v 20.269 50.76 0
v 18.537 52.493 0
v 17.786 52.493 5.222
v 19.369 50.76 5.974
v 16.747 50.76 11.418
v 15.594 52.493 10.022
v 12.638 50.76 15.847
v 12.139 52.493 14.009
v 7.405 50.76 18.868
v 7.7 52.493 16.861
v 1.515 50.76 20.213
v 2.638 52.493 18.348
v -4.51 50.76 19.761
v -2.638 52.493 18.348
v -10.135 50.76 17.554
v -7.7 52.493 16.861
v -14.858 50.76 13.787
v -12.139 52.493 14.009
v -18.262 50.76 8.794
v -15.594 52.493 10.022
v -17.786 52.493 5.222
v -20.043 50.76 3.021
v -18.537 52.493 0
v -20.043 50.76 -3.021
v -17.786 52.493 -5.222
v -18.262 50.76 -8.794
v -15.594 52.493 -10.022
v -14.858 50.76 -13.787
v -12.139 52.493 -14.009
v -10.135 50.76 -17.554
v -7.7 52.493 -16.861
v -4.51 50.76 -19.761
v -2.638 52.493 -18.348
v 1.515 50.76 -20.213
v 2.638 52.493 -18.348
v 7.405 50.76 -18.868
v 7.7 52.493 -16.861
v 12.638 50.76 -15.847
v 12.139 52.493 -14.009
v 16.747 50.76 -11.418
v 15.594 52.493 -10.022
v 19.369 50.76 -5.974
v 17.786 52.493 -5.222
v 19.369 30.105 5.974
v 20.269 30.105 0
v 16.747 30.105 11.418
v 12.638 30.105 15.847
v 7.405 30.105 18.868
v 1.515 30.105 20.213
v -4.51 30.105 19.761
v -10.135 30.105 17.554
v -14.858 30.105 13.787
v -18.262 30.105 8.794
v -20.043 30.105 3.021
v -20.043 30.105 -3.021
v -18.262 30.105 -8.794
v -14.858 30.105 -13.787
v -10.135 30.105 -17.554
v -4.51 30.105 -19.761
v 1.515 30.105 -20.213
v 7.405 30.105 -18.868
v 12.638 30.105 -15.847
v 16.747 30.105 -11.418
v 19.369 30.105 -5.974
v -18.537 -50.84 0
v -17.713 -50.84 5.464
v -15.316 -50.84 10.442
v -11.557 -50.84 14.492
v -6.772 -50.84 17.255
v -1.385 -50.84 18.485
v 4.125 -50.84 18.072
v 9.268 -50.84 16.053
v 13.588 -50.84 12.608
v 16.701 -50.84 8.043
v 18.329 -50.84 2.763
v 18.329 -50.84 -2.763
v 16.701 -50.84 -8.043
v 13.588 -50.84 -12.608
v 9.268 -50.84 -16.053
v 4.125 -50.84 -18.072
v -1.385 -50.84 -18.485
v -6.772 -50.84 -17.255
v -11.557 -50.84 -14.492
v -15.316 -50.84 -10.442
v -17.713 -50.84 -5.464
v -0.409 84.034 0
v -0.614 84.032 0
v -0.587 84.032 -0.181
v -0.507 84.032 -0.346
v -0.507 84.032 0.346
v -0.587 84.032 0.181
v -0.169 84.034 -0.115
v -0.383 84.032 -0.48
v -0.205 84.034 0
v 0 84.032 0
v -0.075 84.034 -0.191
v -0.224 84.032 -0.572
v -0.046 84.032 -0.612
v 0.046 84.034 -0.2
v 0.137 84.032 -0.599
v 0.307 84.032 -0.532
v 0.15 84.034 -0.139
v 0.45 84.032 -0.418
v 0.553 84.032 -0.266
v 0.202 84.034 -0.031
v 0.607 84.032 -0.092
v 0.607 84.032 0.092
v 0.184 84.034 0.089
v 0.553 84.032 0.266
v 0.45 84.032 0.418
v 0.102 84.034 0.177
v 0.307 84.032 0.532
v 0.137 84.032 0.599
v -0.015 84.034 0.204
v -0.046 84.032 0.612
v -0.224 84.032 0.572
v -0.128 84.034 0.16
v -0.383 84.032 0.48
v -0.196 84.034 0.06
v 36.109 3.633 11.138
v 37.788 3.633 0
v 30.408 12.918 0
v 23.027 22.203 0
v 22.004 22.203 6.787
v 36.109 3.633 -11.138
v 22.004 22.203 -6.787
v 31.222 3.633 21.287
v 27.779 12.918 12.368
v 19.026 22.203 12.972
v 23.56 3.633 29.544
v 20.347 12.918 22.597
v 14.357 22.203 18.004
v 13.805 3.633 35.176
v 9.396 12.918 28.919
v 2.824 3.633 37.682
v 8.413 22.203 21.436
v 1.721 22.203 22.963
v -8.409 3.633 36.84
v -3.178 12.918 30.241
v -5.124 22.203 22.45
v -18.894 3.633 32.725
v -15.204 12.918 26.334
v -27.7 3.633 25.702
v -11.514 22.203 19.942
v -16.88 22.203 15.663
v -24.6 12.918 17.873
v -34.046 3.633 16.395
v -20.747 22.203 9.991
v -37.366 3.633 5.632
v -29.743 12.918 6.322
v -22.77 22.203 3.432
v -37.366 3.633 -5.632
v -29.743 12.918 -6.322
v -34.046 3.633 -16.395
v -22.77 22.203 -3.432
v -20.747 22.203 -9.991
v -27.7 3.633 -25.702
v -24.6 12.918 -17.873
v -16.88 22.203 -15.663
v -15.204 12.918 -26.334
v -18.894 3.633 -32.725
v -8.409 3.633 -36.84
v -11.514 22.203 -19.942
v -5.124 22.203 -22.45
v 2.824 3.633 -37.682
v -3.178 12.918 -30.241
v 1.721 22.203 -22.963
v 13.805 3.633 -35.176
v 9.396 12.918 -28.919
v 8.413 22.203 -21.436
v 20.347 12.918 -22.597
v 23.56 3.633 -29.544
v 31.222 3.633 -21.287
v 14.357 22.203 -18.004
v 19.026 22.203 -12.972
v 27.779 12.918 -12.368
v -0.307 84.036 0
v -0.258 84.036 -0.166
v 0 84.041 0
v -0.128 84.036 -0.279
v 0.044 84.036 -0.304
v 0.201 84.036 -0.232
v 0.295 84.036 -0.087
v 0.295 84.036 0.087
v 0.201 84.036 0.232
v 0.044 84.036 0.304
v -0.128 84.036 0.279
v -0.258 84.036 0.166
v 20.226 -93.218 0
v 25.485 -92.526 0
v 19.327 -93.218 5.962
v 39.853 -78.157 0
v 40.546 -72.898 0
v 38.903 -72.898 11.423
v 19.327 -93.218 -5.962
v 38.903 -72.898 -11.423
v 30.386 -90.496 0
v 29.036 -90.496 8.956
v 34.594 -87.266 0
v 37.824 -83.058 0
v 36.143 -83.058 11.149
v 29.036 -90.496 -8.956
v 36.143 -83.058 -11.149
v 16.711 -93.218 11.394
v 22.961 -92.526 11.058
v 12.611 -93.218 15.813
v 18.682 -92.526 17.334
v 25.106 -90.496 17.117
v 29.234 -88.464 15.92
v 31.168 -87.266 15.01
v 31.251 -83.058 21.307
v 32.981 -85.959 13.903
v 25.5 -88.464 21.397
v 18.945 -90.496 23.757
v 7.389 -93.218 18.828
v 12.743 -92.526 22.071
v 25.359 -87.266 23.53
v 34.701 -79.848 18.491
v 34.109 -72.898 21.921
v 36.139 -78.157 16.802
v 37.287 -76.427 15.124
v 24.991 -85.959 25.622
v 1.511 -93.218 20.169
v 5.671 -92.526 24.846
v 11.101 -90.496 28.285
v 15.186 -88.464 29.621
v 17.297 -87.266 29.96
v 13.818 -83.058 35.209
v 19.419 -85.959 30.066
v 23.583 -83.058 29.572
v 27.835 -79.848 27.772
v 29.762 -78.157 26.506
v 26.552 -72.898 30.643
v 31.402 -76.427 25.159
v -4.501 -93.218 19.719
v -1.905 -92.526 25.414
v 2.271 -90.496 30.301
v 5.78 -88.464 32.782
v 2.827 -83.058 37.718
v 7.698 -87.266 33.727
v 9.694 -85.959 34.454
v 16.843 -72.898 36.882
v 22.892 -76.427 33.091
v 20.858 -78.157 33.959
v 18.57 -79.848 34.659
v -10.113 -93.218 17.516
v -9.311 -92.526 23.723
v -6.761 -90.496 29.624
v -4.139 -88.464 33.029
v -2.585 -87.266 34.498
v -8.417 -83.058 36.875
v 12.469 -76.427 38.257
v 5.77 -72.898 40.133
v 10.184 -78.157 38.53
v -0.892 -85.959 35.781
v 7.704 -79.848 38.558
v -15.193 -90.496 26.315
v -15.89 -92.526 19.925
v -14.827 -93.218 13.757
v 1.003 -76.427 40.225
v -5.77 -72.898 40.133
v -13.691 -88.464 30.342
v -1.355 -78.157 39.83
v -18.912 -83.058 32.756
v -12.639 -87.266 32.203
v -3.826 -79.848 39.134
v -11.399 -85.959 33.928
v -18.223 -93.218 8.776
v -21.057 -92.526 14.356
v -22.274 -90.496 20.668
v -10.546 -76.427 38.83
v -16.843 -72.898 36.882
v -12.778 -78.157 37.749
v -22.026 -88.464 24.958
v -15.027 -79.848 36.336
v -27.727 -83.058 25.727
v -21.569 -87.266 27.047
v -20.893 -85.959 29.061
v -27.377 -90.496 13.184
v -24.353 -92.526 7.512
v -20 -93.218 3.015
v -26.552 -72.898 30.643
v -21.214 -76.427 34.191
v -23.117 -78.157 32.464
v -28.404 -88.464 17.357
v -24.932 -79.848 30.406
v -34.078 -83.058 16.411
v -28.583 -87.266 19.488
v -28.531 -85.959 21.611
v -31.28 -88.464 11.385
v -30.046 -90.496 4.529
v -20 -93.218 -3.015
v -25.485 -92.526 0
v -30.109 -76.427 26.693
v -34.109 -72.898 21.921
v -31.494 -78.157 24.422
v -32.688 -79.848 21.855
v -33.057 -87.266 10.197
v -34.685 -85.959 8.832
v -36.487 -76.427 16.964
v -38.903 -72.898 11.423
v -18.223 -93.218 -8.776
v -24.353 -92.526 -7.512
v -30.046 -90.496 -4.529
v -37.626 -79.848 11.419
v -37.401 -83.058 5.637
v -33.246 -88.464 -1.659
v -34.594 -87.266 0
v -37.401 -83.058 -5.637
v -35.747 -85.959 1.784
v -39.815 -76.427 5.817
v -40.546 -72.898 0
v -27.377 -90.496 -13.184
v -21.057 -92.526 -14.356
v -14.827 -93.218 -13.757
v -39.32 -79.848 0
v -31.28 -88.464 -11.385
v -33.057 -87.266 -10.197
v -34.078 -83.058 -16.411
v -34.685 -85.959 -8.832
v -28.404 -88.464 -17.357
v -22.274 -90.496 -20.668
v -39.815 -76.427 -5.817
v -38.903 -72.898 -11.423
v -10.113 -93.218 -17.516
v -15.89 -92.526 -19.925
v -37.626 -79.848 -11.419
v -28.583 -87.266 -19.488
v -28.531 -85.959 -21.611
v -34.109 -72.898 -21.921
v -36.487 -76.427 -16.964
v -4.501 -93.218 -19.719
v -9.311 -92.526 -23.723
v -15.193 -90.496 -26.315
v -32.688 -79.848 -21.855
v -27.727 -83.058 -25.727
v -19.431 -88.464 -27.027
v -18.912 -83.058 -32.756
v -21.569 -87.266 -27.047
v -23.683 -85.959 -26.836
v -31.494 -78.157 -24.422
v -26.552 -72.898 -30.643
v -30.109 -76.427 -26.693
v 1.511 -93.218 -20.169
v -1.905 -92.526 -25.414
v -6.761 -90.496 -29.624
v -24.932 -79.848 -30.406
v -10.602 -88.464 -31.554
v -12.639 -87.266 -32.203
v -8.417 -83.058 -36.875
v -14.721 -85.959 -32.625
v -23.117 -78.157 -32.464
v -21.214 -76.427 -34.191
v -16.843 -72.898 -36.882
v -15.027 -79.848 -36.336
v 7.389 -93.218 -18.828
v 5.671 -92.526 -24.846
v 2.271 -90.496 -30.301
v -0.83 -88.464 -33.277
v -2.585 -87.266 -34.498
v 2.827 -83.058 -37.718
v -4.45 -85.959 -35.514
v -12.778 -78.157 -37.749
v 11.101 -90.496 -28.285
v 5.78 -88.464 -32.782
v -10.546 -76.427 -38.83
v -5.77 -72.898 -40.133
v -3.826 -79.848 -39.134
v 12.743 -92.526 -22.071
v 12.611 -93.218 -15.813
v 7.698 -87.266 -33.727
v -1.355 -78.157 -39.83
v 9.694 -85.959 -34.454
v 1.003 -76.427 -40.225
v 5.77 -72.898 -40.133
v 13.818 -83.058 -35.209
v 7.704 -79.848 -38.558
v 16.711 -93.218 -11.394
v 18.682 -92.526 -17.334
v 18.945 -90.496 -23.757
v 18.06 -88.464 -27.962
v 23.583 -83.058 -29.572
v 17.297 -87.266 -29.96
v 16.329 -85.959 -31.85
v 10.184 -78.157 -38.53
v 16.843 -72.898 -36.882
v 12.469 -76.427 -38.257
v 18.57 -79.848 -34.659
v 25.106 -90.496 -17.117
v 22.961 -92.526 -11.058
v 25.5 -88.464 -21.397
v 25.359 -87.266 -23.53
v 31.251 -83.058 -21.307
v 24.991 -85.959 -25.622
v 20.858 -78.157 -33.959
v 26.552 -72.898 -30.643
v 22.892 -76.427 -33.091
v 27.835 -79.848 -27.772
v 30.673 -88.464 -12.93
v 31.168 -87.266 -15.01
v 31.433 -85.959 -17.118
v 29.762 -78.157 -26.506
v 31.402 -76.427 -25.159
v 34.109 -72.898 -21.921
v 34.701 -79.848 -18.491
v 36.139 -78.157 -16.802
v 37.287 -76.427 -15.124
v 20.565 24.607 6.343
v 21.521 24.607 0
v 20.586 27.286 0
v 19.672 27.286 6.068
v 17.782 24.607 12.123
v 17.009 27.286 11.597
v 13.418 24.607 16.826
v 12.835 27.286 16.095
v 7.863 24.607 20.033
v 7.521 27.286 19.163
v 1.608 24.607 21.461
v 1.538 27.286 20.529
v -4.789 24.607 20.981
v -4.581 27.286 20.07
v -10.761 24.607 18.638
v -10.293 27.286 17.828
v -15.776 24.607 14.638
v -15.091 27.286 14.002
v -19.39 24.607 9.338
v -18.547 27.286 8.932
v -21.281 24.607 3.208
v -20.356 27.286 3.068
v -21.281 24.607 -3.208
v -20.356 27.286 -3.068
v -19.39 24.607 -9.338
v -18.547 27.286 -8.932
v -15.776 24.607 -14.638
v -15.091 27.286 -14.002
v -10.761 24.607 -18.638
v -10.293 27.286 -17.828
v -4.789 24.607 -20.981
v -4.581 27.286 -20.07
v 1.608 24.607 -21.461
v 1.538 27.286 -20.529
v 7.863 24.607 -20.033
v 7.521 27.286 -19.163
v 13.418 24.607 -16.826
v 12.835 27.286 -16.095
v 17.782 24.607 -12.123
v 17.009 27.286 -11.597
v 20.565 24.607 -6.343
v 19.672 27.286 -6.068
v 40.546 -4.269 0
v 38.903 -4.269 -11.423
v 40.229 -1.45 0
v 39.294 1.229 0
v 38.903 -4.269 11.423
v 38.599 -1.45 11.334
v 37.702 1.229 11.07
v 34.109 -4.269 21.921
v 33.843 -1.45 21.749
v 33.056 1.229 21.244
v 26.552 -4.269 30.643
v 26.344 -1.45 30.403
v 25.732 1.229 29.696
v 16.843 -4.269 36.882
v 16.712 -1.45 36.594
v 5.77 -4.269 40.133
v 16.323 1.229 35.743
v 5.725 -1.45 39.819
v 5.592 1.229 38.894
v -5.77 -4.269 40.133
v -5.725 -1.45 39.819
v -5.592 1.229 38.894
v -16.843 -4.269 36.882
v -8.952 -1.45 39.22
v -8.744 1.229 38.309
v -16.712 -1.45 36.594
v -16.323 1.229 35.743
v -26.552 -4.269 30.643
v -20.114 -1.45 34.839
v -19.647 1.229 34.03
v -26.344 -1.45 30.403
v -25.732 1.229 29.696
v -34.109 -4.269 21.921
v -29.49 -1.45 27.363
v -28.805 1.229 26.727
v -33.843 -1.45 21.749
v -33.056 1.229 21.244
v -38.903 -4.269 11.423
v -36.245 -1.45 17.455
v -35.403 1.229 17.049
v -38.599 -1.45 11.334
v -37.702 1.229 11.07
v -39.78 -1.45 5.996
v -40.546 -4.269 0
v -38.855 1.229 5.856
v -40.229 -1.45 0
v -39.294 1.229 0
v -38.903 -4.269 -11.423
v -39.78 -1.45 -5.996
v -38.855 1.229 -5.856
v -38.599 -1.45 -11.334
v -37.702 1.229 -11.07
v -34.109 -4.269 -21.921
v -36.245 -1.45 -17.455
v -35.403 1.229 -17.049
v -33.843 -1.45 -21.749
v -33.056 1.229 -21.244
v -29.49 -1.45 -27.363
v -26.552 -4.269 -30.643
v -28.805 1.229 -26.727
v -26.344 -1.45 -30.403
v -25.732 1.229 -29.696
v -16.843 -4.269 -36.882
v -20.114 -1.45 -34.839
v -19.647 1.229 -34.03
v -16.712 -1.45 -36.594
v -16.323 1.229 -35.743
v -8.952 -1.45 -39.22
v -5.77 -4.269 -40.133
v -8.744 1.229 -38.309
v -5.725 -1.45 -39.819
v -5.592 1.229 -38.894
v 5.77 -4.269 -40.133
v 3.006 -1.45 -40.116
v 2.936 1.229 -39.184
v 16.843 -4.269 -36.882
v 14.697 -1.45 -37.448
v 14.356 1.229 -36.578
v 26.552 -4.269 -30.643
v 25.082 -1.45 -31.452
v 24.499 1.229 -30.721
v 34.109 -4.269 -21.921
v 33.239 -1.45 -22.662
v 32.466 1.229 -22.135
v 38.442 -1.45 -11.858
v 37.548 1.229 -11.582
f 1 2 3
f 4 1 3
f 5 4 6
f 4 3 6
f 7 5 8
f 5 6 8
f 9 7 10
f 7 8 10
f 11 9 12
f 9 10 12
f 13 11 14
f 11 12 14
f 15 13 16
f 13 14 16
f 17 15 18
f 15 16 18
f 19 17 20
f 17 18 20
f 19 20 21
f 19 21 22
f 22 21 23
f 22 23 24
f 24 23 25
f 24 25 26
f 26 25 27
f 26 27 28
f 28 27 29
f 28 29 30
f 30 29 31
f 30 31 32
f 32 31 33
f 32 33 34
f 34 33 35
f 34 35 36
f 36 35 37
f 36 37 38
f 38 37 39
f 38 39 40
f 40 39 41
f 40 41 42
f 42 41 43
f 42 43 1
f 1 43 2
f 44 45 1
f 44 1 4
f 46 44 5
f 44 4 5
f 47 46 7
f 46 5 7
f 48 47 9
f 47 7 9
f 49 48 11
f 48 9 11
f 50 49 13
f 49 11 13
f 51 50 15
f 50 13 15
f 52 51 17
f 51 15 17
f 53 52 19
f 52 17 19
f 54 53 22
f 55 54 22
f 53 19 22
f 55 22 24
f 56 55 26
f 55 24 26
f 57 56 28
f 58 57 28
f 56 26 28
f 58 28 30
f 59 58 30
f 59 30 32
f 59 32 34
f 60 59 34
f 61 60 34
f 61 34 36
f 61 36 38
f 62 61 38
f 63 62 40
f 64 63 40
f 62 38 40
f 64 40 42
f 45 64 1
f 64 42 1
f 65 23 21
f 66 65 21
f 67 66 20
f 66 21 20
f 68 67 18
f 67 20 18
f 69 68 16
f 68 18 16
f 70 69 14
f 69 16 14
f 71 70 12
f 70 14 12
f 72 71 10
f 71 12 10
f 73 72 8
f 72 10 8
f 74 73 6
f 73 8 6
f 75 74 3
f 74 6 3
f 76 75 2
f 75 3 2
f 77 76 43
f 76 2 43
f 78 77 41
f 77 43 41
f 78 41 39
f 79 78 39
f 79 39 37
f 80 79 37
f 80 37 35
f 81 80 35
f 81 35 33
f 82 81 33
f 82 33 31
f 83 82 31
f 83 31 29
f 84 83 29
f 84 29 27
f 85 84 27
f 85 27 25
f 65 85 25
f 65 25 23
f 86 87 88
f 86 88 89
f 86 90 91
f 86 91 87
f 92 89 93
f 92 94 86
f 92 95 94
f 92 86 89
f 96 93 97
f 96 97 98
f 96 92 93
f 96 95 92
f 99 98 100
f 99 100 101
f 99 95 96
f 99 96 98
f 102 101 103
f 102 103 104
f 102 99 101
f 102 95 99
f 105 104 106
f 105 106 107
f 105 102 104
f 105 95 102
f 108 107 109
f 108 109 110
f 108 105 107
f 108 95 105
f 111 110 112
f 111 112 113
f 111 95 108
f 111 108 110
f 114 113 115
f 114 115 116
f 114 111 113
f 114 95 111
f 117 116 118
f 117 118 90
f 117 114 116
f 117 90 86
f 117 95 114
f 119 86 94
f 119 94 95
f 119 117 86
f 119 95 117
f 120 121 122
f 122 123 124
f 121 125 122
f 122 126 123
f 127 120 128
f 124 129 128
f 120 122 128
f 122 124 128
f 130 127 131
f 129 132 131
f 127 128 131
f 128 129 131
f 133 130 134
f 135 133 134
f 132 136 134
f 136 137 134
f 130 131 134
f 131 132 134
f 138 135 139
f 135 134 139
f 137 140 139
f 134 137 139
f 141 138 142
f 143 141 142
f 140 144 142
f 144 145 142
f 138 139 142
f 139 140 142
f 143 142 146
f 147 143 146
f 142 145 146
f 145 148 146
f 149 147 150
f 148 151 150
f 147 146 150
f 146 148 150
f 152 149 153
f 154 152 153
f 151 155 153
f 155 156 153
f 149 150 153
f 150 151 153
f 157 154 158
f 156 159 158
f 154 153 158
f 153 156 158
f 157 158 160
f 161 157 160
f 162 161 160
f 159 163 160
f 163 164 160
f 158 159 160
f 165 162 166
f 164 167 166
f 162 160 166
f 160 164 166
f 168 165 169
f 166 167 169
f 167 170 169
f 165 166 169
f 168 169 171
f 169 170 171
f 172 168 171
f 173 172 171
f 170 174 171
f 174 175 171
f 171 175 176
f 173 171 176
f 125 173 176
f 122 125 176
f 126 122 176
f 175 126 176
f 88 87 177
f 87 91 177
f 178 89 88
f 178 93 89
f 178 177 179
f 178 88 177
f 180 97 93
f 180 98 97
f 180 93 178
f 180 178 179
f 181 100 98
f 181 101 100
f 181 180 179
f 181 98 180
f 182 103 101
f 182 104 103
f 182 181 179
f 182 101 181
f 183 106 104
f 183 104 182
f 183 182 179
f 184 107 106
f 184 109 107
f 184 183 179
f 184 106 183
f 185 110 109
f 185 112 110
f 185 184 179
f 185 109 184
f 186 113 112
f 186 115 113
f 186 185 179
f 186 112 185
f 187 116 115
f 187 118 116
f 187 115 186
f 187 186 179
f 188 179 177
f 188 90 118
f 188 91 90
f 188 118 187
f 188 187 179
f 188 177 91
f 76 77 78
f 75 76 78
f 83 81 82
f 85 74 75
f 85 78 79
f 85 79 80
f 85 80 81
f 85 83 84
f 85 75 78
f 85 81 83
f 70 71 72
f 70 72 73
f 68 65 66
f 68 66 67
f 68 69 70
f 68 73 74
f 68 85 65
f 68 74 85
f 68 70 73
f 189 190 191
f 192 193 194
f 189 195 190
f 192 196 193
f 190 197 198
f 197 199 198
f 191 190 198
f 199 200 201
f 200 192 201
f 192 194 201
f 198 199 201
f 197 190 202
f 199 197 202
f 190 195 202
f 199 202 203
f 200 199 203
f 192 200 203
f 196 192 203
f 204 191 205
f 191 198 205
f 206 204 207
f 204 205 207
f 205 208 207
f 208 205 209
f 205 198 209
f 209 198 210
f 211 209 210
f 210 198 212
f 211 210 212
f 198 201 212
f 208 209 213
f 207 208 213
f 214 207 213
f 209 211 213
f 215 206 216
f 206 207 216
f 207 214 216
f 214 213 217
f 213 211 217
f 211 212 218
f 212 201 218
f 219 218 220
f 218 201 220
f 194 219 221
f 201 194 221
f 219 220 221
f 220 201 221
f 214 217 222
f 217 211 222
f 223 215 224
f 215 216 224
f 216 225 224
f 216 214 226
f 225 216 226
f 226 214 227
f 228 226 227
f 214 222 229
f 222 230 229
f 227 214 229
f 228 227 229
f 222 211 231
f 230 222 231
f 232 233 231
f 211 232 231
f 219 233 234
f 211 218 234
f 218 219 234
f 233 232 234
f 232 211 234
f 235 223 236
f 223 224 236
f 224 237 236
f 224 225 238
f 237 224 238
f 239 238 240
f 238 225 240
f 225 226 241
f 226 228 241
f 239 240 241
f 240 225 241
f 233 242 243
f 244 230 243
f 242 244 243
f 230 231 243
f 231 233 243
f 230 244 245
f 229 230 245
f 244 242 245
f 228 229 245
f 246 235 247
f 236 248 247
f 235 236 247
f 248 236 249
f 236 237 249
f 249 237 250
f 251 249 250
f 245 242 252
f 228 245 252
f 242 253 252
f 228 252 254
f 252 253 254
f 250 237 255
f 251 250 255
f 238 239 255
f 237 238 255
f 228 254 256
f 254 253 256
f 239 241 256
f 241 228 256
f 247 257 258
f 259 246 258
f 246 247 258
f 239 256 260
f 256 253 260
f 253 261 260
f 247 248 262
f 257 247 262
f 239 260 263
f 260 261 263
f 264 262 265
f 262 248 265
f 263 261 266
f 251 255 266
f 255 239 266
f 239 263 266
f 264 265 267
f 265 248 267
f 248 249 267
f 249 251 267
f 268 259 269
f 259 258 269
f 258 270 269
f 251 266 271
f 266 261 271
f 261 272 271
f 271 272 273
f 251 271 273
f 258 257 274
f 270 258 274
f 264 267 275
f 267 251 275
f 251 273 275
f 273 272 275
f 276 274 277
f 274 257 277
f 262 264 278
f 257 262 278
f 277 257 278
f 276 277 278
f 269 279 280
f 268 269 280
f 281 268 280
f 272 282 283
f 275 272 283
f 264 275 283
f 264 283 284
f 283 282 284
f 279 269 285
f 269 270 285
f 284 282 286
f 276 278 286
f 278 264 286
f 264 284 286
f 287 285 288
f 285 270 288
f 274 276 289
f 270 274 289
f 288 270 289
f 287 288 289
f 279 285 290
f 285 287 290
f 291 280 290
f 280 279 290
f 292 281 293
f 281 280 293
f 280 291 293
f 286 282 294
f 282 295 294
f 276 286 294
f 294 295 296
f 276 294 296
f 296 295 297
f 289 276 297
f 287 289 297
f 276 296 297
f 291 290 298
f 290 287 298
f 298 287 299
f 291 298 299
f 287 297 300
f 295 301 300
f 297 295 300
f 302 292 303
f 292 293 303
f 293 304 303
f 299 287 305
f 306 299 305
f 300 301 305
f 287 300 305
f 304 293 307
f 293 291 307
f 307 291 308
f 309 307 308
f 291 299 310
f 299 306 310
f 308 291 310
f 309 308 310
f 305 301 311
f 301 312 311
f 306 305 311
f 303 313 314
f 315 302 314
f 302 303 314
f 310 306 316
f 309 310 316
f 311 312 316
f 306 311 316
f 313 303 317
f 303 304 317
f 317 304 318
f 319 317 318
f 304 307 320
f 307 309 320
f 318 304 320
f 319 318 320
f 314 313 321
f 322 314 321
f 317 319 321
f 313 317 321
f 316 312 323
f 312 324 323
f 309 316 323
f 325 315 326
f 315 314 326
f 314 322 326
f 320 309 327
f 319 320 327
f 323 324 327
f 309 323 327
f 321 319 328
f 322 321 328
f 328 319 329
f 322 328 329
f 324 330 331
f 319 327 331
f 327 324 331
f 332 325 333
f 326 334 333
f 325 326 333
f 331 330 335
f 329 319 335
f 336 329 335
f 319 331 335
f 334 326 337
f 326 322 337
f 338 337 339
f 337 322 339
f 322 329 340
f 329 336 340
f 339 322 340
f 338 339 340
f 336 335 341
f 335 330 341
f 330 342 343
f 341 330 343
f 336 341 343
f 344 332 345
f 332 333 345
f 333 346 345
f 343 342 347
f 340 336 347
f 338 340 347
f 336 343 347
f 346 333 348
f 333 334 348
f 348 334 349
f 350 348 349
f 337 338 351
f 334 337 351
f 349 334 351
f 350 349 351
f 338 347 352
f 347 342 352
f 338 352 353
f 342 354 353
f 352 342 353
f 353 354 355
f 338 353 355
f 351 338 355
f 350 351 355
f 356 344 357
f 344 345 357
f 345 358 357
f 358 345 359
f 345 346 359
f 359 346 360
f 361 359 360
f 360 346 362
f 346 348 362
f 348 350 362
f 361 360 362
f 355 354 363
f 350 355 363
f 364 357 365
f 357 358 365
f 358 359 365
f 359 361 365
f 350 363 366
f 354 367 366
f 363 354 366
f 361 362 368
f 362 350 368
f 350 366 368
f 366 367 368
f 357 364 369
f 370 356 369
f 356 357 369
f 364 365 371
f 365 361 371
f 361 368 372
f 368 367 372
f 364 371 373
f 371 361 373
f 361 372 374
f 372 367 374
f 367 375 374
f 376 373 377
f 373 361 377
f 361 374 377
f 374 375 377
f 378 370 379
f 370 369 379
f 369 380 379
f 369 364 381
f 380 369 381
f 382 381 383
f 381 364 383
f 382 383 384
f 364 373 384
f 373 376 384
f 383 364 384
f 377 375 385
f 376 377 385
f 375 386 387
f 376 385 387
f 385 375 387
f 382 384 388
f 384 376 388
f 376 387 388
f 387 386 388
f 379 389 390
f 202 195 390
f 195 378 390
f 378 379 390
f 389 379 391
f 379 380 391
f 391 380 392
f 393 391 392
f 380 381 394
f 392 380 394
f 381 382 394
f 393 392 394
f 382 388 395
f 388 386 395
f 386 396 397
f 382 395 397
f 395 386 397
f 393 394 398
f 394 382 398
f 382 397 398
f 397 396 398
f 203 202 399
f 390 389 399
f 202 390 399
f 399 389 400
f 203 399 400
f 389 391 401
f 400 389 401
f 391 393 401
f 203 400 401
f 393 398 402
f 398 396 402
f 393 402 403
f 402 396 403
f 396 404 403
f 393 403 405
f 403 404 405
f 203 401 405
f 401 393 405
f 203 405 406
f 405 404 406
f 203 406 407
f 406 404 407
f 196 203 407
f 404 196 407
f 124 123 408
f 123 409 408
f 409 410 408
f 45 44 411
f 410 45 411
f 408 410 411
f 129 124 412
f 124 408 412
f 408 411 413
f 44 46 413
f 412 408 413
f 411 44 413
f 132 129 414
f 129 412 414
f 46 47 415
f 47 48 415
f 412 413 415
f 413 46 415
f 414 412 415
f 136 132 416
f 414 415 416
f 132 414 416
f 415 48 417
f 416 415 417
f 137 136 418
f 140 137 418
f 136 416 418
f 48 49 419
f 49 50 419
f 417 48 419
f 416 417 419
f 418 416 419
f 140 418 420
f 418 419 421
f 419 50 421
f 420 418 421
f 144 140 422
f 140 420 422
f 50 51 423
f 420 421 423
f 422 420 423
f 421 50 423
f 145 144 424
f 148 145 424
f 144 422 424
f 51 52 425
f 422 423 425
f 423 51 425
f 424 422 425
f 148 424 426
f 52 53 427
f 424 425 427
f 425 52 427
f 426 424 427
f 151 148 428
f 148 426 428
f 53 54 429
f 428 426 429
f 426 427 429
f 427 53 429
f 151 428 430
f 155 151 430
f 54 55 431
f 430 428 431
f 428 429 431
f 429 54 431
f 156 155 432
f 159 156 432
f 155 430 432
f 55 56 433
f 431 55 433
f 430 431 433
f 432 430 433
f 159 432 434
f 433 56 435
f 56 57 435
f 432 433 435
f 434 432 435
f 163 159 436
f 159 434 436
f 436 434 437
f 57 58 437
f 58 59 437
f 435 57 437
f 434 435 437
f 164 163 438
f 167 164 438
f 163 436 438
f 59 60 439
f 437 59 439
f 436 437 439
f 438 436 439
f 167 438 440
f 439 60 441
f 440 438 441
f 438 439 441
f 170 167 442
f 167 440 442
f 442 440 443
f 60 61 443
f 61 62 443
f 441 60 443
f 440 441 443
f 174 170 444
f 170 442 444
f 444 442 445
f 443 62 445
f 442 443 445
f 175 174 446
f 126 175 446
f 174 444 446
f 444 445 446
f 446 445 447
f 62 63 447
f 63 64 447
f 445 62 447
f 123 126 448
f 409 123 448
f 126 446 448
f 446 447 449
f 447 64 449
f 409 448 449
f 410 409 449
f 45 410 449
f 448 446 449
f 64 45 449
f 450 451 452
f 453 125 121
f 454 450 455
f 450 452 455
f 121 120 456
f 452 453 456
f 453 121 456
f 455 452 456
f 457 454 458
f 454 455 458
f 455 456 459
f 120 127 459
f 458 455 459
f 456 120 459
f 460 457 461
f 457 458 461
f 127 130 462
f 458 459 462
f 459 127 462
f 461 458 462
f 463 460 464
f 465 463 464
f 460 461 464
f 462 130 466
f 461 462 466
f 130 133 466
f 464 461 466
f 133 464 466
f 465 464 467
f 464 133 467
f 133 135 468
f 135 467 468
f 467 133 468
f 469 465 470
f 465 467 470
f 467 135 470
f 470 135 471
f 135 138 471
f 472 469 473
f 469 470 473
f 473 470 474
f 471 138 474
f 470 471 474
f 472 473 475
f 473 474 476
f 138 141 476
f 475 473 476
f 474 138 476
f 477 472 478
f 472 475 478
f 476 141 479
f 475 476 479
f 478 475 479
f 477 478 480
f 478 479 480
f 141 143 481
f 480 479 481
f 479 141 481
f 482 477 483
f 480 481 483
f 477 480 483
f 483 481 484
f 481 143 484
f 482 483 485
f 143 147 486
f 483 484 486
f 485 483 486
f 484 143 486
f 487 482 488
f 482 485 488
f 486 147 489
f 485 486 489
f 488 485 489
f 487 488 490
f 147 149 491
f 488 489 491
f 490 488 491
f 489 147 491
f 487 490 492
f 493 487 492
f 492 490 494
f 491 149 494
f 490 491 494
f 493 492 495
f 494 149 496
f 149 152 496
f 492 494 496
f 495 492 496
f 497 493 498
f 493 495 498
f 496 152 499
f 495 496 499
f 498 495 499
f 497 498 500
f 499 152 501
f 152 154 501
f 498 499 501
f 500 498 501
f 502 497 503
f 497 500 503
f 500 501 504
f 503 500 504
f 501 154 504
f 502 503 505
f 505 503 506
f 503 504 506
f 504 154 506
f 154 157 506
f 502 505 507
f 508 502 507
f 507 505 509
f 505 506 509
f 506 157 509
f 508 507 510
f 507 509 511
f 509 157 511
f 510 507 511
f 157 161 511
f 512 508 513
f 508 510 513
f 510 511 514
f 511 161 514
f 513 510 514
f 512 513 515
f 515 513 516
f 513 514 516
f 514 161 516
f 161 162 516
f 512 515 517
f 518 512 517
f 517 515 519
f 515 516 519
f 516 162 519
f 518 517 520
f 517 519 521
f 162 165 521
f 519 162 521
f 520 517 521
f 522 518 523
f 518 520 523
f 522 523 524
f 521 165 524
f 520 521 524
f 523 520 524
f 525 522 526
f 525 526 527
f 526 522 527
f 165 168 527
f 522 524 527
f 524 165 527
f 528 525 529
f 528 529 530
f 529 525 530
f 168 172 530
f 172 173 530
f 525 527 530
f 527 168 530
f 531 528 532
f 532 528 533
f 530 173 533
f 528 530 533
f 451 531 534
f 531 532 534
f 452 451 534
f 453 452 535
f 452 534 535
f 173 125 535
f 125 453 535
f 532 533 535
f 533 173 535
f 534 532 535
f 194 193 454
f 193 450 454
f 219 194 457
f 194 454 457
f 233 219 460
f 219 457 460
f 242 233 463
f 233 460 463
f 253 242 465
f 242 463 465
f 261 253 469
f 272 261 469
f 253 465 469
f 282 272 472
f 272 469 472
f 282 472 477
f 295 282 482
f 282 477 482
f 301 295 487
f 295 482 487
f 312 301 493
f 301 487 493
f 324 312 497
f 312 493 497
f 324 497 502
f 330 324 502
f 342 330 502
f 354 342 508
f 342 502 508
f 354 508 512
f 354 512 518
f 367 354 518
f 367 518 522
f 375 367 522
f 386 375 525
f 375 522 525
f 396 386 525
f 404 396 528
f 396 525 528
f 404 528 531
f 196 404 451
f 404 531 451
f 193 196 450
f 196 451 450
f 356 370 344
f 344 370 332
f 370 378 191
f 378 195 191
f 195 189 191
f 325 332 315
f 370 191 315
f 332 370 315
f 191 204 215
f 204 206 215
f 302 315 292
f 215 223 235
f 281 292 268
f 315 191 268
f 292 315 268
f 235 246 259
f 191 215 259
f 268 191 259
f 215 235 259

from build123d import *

# Parameters (mm, degrees)
F5_R     = 18.5365010698
F6_DEPTH = 114.3


# Not quite as in the source:
# - a fillet or chamfer that OpenCascade refuses, or shapes differently, is made with other operations: its cross-section is extruded or revolved along the edge and cut away or added


with BuildPart() as f1:
    # F0 (on Top) → F1 (revolve)
    with BuildSketch(Plane.XY):
        with BuildLine():
            Line((0, 84.0317292744), (0, 84.0408968434))
            Line((0, 84.0408968434), (-0.6141534664, 84.0316613536))
            ThreePointArc((-0.6141534664, 84.0316613536), (-0.3070769866, 84.0339870748), (0, 84.0317292744))
        make_face()
    revolve(axis=Axis((0, 84.0363130589, 0), (0, -1, 0)))


with BuildPart() as f1b:
    # F0 (on Top) → F1, piece 2 (revolve)
    with BuildSketch(Plane.XY):
        with BuildLine():
            Line((0, 63.4599872006), (0, -93.2180002618))
            Line((0, -93.2180002618), (20.2258732946, -93.2180002618))
            ThreePointArc((20.2258732946, -93.2180002618), (34.5942830883, -87.2664100555), (40.5458732946, -72.8980002618))
            Line((40.5458732946, -72.8980002618), (40.5458732946, -4.2690273975))
            ThreePointArc((40.5458732946, -4.2690273975), (39.8365270619, -0.084027728), (37.7877280609, 3.6334737133))
            Line((37.7877280609, 3.6334737133), (23.0273435769, 22.2029869316))
            ThreePointArc((23.0273435769, 22.2029869316), (20.9785445759, 25.9204883728), (20.2691983432, 30.1054880424))
            Line((20.2691983432, 30.1054880424), (20.2691983432, 63.4599872006))
            Line((20.2691983432, 63.4599872006), (0, 63.4599872006))
        make_face()
    revolve(axis=Axis((0, 84.0363130589, 0), (0, -1, 0)))

    # F5 (on face) → F6 (cut)
    with BuildSketch(Plane(origin=(0, 63.4599872006, 0), x_dir=(-1, 0, 0), z_dir=(0, 1, 0))):
        Circle(F5_R)
    extrude(amount=-F6_DEPTH, mode=Mode.SUBTRACT)

    # F7: chamfer of 12.7 on 1 edges, made by hand

    # F7_s1 → F7_t2 (revolve, cut)
    with BuildSketch(Plane.XY):
        Polygon((20.2691983432, 50.7599872006), (7.5691983432, 63.4599872006), (20.2691983432, 63.4599872006), align=None)
    revolve(axis=Axis((0, 63.4599872006, 0), (0, -1, 0)), mode=Mode.SUBTRACT)


with BuildPart() as f3:
    # F2 (on Top) → F3 (revolve)
    with BuildSketch(Plane.XY):
        Polygon((0, 62.8846511245), (0, 21.3541854173), (23.9753127098, 21.3541854173), (8.4013864398, 62.8846511245), align=None)
    revolve(axis=Axis((0, 42.1194182709, 0), (0, -1, 0)))


solid = Compound([f1.part, f1b.part])
